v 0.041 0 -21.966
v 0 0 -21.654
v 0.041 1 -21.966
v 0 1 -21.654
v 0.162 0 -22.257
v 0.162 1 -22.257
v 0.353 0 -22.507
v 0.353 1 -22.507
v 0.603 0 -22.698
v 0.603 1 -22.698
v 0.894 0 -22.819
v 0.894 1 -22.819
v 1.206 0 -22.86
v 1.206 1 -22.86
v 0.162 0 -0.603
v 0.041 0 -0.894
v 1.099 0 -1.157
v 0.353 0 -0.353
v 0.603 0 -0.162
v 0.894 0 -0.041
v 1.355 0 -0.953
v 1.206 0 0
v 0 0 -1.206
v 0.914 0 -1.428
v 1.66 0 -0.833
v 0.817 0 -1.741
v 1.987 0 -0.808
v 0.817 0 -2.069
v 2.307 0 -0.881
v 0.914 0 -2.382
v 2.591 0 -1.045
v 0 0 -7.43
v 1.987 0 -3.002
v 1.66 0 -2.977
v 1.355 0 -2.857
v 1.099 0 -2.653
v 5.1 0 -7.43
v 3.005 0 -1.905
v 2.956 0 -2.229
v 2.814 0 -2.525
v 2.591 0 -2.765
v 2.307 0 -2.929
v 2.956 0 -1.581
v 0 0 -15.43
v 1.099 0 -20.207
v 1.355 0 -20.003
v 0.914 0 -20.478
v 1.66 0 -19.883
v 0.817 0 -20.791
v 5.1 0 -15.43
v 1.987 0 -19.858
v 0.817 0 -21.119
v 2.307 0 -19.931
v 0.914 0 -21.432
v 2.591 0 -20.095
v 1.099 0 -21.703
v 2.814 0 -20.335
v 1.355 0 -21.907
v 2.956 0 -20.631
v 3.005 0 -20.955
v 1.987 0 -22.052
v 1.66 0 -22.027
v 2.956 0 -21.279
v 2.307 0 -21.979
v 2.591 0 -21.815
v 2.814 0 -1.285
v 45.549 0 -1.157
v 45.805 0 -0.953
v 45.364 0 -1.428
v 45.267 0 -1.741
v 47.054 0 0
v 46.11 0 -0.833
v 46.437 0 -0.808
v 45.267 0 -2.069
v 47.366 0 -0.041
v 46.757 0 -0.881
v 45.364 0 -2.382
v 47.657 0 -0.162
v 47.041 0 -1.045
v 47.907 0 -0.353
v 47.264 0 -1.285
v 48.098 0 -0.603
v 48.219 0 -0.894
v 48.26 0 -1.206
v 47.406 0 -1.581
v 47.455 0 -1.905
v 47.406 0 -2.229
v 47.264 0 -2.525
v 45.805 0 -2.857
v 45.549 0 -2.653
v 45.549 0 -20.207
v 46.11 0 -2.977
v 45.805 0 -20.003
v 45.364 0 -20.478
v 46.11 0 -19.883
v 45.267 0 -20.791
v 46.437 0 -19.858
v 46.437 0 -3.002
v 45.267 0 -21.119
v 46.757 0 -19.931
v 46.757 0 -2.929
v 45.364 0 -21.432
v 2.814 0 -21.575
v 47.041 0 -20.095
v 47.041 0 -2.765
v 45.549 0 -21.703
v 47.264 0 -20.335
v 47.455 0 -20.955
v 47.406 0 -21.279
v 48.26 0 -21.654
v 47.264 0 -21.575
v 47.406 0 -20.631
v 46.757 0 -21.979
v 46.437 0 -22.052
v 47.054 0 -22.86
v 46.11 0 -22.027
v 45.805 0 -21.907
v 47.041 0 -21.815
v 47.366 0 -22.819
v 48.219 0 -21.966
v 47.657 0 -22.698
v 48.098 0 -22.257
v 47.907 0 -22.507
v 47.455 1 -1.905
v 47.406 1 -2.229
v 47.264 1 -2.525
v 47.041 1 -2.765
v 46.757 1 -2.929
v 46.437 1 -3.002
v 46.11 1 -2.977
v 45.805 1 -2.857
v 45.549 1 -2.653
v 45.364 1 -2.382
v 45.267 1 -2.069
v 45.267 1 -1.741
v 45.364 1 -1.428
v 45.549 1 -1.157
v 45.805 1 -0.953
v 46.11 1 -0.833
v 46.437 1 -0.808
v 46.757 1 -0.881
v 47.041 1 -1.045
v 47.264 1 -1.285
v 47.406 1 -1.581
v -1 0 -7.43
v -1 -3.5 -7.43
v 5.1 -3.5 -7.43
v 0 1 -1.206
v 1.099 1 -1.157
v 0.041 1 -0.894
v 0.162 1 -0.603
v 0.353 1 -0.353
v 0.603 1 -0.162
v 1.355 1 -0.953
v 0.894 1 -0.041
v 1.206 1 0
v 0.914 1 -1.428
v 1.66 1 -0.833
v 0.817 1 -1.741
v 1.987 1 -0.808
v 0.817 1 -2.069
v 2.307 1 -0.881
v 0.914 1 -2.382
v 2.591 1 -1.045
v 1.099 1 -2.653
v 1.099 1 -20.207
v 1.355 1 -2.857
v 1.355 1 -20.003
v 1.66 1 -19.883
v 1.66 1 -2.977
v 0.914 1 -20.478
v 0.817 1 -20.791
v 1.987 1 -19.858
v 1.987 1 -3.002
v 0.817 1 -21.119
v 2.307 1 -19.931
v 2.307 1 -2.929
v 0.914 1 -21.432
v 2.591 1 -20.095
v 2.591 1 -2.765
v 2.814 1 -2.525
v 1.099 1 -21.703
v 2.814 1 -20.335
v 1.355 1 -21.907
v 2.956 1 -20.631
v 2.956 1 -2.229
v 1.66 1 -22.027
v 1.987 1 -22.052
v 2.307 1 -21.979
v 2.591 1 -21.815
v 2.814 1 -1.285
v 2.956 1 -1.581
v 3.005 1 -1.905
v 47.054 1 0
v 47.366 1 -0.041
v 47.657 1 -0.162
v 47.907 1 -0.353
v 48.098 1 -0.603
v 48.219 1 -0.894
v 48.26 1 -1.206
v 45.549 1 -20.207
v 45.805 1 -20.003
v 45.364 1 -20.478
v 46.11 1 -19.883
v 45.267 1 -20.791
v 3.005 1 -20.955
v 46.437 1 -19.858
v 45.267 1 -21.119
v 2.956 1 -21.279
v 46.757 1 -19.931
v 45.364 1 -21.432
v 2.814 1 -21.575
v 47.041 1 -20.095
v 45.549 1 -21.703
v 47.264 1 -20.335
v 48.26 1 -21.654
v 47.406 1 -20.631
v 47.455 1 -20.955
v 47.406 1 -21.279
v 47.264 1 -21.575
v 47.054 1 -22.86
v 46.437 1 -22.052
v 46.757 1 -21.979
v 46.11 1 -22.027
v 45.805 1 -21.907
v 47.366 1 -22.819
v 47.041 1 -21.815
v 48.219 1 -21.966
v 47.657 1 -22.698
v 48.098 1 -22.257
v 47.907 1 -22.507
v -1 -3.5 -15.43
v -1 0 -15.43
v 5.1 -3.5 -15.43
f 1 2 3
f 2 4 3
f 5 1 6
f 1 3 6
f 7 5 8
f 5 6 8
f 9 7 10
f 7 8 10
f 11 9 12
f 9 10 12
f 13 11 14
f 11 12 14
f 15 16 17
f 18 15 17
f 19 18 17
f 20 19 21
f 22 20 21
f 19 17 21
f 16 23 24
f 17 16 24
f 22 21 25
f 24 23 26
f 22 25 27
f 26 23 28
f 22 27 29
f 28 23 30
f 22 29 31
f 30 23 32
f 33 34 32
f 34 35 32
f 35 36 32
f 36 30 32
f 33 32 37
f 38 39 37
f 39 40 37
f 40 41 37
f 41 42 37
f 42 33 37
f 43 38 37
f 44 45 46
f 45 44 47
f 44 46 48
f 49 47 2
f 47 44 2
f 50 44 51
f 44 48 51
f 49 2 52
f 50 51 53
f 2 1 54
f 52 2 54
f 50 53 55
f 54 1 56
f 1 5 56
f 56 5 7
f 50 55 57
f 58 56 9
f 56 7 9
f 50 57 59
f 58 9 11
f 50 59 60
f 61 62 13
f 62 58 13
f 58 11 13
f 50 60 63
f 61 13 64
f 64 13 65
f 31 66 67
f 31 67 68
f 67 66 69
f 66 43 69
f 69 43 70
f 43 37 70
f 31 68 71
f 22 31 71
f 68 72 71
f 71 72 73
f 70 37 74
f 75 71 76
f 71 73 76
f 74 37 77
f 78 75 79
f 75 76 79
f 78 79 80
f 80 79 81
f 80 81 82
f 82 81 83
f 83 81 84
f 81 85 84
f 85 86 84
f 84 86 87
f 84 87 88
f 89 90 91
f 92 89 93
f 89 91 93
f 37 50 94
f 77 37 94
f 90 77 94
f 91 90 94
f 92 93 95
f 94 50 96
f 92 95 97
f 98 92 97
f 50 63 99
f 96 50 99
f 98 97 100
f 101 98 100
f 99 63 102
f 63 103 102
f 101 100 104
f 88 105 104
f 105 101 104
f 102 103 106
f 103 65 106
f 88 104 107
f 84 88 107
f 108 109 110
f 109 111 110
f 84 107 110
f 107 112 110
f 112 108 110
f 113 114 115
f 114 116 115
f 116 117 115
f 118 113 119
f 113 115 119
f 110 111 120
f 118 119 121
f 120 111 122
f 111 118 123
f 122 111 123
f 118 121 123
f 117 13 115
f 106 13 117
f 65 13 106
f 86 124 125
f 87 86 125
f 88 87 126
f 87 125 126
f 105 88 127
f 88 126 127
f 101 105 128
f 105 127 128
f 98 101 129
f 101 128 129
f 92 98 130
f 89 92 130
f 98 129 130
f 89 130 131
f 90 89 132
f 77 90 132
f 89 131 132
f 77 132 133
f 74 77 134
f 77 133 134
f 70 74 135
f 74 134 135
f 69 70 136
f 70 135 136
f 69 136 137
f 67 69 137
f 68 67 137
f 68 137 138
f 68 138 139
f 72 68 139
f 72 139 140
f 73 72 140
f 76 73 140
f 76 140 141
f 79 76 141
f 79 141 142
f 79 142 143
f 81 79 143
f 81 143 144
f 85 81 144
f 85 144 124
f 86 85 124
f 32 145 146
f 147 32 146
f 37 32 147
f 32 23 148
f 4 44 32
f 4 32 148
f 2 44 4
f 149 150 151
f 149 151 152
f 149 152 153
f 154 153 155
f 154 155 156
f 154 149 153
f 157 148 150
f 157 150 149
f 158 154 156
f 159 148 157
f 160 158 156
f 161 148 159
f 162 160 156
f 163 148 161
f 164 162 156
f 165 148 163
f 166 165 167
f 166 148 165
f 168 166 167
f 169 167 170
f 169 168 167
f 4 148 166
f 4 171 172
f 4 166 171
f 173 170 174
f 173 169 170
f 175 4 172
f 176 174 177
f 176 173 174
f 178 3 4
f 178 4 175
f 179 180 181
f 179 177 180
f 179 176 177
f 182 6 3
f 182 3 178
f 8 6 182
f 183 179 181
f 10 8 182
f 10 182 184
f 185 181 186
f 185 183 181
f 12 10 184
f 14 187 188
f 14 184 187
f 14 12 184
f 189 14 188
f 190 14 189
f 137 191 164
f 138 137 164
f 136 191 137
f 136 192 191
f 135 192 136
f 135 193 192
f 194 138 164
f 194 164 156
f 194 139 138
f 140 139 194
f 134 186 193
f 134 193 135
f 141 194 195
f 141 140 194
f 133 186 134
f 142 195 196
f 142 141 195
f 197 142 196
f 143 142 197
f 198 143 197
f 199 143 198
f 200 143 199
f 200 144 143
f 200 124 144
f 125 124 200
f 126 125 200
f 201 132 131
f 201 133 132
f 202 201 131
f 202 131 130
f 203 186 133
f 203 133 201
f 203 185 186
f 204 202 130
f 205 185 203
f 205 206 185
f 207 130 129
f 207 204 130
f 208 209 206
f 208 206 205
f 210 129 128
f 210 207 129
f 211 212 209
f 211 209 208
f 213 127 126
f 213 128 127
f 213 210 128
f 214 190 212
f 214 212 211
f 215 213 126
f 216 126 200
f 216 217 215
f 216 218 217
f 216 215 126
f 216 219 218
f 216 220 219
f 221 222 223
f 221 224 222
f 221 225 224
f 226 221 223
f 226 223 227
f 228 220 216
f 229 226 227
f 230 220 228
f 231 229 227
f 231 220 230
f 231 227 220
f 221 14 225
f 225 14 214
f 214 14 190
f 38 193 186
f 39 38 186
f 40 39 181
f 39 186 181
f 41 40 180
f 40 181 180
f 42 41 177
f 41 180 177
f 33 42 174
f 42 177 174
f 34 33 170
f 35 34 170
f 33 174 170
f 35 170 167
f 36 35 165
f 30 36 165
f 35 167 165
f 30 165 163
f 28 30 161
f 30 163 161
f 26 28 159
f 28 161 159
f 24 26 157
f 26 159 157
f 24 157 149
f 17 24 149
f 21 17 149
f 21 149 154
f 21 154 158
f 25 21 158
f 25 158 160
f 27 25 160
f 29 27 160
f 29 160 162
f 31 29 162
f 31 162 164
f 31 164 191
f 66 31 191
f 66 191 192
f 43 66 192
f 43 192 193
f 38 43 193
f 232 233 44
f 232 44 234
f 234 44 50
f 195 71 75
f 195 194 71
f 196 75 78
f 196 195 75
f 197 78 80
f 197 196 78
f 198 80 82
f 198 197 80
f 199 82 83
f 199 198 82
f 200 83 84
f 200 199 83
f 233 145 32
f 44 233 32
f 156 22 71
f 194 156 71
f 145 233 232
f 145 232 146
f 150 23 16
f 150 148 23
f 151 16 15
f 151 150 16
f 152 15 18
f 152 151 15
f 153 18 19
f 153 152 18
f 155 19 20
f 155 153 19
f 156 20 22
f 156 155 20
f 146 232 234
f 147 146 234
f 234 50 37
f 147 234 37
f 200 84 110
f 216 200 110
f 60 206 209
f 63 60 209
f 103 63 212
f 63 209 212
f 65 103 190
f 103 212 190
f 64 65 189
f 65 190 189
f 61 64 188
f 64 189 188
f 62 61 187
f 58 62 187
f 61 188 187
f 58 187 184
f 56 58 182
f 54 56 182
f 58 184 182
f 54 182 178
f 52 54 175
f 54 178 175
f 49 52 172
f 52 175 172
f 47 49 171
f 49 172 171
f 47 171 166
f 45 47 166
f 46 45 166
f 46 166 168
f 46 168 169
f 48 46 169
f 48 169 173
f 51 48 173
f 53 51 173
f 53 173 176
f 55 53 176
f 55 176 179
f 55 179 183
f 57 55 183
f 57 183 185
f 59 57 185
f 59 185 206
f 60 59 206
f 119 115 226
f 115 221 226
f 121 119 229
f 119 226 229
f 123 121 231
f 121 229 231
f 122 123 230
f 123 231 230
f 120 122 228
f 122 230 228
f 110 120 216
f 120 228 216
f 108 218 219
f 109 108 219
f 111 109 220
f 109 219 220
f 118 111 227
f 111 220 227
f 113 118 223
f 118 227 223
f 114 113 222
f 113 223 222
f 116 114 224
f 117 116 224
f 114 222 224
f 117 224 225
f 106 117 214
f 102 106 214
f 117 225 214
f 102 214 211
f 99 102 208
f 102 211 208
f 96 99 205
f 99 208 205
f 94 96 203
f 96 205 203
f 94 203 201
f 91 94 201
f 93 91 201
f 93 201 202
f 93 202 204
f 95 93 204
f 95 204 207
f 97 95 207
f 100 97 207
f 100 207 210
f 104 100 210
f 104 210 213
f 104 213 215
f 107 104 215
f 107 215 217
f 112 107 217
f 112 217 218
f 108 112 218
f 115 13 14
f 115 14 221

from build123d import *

# Parameters (mm, degrees)
SKETCH1_W               = 48.26
SKETCH1_H               = 22.86
BOSS_EXTRUDE1_DEPTH     = 1
SKETCH2_R               = 1.09982
CUT_EXTRUDE1_DEPTH      = 1
CUT_EXTRUDE1_DEPTH_BACK = 2
FILLET1_R               = 1.2065
SKETCH3_W               = 6.1
SKETCH3_H               = 8
BOSS_EXTRUDE2_DEPTH     = 3.5


with BuildPart() as part:
    # Sketch1 → Boss-Extrude1 (new body)
    with BuildSketch(Plane(origin=(0, 0, 0), x_dir=(1, 0, 0), z_dir=(0, 1, 0))):
        with Locations((24.13, 11.43)):
            Rectangle(SKETCH1_W, SKETCH1_H)
    extrude(amount=BOSS_EXTRUDE1_DEPTH)

    # Sketch2 → Cut-Extrude1 (cut, two sides)
    with BuildSketch(Plane(origin=(0, 1, 0), x_dir=(1, 0, 0), z_dir=(0, 1, 0))) as cut_extrude1_sk:
        with Locations((1.905, 20.955)):
            Circle(SKETCH2_R)
        with Locations((1.905, 1.905)):
            Circle(SKETCH2_R)
        with Locations((46.355, 1.905)):
            Circle(SKETCH2_R)
        with Locations((46.355, 20.955)):
            Circle(SKETCH2_R)
    extrude(amount=CUT_EXTRUDE1_DEPTH, mode=Mode.SUBTRACT)
    extrude(cut_extrude1_sk.sketch, amount=-CUT_EXTRUDE1_DEPTH_BACK, mode=Mode.SUBTRACT)

    # Fillet1
    fillet1_edges = [part.edges().sort_by_distance(p)[0] for p in [
        (0, 0.5, -22.86),
        (48.26, 0.5, -22.86),
        (48.26, 0.5, 0),
        (0, 0.5, 0),
    ]]
    fillet(fillet1_edges, radius=FILLET1_R)

    # Sketch3 → Boss-Extrude2 (add)
    with BuildSketch(Plane.XZ):
        with Locations((2.05, -11.43)):
            Rectangle(SKETCH3_W, SKETCH3_H)
    extrude(amount=BOSS_EXTRUDE2_DEPTH)


solid = part.part
